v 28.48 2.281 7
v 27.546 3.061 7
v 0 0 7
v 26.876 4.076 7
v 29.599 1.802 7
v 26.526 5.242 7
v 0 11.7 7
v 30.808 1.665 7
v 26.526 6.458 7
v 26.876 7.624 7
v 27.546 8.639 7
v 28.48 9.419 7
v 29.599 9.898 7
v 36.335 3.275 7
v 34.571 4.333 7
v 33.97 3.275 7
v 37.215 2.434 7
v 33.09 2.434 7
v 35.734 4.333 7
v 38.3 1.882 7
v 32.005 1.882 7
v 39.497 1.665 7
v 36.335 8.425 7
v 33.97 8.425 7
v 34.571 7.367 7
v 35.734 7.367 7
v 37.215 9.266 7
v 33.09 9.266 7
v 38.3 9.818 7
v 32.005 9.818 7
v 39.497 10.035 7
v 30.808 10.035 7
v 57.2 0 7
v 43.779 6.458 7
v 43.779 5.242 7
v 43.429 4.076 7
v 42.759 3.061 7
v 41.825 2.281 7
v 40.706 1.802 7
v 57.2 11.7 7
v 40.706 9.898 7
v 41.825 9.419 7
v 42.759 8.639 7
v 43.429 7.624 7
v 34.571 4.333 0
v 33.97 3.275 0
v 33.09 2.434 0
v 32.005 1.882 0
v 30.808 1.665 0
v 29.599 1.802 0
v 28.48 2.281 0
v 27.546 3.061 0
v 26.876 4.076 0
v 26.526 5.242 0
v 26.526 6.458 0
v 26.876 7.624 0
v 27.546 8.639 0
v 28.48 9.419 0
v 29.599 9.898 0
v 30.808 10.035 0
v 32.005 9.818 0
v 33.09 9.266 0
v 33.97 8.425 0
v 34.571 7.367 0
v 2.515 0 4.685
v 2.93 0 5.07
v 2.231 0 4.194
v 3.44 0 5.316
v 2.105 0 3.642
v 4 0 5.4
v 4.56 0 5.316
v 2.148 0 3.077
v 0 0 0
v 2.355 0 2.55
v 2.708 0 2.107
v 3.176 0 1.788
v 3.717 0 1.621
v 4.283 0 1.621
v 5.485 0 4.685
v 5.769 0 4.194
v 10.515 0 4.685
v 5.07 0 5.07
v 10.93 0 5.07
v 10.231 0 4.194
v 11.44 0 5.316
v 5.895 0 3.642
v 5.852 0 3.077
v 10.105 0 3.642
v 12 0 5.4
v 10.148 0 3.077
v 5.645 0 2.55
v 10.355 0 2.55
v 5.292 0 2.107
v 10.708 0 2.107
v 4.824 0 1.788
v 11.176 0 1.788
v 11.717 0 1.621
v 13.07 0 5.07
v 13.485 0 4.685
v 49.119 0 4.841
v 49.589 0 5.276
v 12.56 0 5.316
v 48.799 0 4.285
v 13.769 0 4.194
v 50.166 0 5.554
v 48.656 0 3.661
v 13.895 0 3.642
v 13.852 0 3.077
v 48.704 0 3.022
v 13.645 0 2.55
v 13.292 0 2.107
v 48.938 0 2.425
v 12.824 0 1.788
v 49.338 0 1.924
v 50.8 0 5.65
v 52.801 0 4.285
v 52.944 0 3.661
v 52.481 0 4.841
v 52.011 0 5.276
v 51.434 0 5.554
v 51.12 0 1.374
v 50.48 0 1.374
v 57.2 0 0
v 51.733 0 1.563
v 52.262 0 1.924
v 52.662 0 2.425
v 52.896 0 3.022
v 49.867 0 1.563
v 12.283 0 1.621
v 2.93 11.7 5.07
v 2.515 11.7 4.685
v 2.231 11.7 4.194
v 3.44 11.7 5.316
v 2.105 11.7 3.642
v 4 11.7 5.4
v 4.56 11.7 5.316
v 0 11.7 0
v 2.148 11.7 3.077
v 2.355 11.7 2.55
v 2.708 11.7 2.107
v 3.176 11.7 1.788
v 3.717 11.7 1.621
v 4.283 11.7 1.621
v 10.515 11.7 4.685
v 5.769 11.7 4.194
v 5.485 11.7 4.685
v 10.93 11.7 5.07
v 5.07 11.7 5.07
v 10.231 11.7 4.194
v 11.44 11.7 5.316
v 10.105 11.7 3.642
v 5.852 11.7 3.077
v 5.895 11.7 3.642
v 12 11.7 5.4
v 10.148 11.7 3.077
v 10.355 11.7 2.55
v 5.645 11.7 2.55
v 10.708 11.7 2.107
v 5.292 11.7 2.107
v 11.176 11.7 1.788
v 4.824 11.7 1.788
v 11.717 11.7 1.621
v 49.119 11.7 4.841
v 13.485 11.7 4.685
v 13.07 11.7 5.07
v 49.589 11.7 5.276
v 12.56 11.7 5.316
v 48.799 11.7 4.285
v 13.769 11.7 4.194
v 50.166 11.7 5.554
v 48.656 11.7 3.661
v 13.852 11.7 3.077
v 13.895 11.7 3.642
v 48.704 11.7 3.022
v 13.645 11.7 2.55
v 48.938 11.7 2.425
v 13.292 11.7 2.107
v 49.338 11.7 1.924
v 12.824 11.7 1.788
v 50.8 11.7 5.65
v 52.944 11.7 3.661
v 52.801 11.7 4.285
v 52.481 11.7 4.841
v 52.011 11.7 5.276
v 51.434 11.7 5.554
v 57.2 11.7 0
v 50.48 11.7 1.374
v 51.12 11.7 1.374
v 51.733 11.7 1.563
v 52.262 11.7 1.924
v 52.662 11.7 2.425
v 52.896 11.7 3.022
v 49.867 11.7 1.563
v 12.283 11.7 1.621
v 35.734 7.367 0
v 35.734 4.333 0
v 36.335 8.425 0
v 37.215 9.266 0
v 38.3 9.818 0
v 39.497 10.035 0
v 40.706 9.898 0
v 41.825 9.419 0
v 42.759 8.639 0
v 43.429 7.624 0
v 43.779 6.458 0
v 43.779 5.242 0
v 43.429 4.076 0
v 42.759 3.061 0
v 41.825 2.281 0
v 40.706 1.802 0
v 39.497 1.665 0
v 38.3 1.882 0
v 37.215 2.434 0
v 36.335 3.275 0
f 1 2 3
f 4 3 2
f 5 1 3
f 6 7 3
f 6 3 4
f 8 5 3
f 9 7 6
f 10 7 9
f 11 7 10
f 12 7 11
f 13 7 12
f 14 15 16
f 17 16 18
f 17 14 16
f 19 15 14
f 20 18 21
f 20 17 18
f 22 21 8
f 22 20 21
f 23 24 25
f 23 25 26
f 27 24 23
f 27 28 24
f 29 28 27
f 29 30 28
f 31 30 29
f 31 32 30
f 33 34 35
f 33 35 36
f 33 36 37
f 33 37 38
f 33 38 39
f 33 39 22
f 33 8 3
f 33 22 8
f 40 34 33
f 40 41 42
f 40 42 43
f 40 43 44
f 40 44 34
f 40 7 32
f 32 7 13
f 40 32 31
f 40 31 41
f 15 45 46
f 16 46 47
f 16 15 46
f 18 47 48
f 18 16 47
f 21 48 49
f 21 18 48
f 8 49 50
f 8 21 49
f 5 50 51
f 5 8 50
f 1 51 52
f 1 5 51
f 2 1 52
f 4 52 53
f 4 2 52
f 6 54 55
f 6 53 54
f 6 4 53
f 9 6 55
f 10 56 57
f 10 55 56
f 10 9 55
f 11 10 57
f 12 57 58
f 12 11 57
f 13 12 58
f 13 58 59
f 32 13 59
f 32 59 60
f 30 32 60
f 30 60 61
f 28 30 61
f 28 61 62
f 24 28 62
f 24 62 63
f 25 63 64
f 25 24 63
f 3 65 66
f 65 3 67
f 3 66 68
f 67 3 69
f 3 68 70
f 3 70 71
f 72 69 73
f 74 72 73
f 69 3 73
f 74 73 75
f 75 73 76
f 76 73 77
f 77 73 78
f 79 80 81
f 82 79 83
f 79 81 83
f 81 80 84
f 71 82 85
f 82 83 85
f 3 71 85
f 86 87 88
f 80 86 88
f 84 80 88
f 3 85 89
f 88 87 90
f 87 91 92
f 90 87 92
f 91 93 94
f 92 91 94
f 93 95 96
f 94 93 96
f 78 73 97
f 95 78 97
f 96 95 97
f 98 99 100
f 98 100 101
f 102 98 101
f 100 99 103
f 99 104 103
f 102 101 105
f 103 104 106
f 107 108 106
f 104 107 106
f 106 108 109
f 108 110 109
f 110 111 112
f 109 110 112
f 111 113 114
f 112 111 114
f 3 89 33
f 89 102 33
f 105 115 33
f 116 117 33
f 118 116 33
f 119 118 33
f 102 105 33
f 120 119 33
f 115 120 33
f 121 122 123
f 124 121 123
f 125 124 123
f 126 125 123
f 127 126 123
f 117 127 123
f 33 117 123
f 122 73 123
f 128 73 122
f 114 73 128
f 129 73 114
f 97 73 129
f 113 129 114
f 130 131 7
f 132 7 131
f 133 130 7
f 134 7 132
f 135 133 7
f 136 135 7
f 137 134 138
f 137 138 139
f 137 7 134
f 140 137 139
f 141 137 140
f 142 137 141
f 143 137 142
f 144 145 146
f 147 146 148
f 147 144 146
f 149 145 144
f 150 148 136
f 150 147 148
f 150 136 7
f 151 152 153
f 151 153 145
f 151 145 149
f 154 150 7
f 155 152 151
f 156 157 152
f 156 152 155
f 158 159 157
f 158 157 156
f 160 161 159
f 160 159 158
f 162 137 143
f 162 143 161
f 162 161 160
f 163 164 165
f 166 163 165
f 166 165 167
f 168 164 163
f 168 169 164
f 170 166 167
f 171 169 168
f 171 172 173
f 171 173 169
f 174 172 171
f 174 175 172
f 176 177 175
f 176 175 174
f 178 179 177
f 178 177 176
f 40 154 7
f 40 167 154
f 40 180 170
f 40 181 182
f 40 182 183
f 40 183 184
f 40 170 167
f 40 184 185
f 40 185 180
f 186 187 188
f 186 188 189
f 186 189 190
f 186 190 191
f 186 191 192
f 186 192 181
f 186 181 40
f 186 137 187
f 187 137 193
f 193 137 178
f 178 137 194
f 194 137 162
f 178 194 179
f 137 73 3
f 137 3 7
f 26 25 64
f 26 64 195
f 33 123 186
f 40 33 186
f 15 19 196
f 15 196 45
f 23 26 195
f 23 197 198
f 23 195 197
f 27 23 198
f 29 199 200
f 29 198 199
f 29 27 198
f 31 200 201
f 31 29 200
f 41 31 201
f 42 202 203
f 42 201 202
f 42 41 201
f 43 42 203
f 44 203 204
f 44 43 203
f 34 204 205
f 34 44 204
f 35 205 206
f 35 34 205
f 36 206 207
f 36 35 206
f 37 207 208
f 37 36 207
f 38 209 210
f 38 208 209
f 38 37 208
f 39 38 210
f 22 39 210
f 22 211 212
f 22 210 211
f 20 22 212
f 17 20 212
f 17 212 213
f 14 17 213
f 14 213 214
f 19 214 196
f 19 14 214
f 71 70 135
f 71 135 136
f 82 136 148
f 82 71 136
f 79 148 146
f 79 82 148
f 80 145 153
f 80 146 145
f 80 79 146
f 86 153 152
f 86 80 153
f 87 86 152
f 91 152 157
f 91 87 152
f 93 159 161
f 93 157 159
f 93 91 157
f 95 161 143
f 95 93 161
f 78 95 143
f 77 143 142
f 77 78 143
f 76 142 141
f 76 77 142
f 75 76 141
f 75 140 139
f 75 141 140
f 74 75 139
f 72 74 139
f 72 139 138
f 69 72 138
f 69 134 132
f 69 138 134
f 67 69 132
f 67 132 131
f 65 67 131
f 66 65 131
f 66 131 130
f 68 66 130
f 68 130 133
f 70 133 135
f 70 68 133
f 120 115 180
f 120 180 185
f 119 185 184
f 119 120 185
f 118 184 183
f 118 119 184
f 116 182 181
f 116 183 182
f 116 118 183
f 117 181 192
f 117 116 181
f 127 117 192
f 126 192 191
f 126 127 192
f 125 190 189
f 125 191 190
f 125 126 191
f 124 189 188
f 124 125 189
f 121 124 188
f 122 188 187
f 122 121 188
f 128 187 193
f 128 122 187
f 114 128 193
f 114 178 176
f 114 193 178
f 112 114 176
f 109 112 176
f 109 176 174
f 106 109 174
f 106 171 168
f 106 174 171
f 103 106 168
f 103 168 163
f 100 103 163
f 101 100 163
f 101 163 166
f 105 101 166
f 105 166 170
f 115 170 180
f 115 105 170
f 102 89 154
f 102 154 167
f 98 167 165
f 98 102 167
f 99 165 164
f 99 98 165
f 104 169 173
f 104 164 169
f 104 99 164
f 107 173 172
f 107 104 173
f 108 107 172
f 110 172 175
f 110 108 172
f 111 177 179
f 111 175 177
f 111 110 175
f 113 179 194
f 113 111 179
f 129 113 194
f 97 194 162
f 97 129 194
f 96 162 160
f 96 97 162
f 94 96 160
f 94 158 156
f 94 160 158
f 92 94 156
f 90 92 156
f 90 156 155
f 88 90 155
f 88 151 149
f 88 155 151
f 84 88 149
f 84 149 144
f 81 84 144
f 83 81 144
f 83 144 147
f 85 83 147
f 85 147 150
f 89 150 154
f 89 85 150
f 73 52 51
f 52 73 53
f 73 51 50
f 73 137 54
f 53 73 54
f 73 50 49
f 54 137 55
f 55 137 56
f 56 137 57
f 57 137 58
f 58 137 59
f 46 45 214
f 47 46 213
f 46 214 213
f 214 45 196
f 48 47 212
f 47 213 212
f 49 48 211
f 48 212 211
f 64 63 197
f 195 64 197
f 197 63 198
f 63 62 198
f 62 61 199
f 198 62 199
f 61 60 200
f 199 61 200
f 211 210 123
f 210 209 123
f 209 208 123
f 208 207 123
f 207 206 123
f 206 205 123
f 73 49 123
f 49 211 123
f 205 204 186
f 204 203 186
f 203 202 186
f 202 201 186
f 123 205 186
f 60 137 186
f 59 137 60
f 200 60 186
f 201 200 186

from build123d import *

# Parameters (mm, degrees)
SKETCH1_W               = 57.2
SKETCH1_H               = 11.7
BOSS_EXTRUDE1_DEPTH     = 7
CUT_EXTRUDE1_DEPTH      = 59.802465935
CUT_EXTRUDE1_DEPTH_BACK = 59.802465935
SKETCH2_R               = 2.15
SKETCH2_R_2             = 1.9
CUT_EXTRUDE2_DEPTH      = 59.802465935


with BuildPart() as part:
    # Sketch1 → Boss-Extrude1 (new body)
    with BuildSketch(Plane.XY):
        with Locations((28.6, 5.85)):
            Rectangle(SKETCH1_W, SKETCH1_H)
    extrude(amount=BOSS_EXTRUDE1_DEPTH)

    # Sketch2 → Cut-Extrude1 (cut, two sides: drawn at the far end of the back side and taken through both)
    with BuildSketch(Plane(origin=(0, 11.7, 0), x_dir=(1, 0, 0), z_dir=(0, 1, 0)).offset(-CUT_EXTRUDE1_DEPTH_BACK)):
        with Locations(Location((50.8, -3.5, 0), (0, 0, 270))):
            Circle(SKETCH2_R)
        with Locations(Location((4, -3.5, 0), (0, 0, 270))):
            Circle(SKETCH2_R_2)
        with Locations(Location((12, -3.5, 0), (0, 0, 270))):
            Circle(SKETCH2_R_2)
    extrude(amount=CUT_EXTRUDE1_DEPTH + CUT_EXTRUDE1_DEPTH_BACK, mode=Mode.SUBTRACT)

    # Sketch3 → Cut-Extrude2 (cut, through all)
    with BuildSketch(Plane.XY.offset(7)):
        with BuildLine():
            Line((34.57071198, 7.367429549), (35.734206681, 7.367429549))
            ThreePointArc((35.734206681, 7.367429549), (43.82348168, 5.85), (35.734206681, 4.332570451))
            Line((35.734206681, 4.332570451), (34.57071198, 4.332570451))
            ThreePointArc((34.57071198, 4.332570451), (26.48143698, 5.85), (34.57071198, 7.367429549))
        make_face()
    extrude(amount=-CUT_EXTRUDE2_DEPTH, mode=Mode.SUBTRACT)


solid = part.part
